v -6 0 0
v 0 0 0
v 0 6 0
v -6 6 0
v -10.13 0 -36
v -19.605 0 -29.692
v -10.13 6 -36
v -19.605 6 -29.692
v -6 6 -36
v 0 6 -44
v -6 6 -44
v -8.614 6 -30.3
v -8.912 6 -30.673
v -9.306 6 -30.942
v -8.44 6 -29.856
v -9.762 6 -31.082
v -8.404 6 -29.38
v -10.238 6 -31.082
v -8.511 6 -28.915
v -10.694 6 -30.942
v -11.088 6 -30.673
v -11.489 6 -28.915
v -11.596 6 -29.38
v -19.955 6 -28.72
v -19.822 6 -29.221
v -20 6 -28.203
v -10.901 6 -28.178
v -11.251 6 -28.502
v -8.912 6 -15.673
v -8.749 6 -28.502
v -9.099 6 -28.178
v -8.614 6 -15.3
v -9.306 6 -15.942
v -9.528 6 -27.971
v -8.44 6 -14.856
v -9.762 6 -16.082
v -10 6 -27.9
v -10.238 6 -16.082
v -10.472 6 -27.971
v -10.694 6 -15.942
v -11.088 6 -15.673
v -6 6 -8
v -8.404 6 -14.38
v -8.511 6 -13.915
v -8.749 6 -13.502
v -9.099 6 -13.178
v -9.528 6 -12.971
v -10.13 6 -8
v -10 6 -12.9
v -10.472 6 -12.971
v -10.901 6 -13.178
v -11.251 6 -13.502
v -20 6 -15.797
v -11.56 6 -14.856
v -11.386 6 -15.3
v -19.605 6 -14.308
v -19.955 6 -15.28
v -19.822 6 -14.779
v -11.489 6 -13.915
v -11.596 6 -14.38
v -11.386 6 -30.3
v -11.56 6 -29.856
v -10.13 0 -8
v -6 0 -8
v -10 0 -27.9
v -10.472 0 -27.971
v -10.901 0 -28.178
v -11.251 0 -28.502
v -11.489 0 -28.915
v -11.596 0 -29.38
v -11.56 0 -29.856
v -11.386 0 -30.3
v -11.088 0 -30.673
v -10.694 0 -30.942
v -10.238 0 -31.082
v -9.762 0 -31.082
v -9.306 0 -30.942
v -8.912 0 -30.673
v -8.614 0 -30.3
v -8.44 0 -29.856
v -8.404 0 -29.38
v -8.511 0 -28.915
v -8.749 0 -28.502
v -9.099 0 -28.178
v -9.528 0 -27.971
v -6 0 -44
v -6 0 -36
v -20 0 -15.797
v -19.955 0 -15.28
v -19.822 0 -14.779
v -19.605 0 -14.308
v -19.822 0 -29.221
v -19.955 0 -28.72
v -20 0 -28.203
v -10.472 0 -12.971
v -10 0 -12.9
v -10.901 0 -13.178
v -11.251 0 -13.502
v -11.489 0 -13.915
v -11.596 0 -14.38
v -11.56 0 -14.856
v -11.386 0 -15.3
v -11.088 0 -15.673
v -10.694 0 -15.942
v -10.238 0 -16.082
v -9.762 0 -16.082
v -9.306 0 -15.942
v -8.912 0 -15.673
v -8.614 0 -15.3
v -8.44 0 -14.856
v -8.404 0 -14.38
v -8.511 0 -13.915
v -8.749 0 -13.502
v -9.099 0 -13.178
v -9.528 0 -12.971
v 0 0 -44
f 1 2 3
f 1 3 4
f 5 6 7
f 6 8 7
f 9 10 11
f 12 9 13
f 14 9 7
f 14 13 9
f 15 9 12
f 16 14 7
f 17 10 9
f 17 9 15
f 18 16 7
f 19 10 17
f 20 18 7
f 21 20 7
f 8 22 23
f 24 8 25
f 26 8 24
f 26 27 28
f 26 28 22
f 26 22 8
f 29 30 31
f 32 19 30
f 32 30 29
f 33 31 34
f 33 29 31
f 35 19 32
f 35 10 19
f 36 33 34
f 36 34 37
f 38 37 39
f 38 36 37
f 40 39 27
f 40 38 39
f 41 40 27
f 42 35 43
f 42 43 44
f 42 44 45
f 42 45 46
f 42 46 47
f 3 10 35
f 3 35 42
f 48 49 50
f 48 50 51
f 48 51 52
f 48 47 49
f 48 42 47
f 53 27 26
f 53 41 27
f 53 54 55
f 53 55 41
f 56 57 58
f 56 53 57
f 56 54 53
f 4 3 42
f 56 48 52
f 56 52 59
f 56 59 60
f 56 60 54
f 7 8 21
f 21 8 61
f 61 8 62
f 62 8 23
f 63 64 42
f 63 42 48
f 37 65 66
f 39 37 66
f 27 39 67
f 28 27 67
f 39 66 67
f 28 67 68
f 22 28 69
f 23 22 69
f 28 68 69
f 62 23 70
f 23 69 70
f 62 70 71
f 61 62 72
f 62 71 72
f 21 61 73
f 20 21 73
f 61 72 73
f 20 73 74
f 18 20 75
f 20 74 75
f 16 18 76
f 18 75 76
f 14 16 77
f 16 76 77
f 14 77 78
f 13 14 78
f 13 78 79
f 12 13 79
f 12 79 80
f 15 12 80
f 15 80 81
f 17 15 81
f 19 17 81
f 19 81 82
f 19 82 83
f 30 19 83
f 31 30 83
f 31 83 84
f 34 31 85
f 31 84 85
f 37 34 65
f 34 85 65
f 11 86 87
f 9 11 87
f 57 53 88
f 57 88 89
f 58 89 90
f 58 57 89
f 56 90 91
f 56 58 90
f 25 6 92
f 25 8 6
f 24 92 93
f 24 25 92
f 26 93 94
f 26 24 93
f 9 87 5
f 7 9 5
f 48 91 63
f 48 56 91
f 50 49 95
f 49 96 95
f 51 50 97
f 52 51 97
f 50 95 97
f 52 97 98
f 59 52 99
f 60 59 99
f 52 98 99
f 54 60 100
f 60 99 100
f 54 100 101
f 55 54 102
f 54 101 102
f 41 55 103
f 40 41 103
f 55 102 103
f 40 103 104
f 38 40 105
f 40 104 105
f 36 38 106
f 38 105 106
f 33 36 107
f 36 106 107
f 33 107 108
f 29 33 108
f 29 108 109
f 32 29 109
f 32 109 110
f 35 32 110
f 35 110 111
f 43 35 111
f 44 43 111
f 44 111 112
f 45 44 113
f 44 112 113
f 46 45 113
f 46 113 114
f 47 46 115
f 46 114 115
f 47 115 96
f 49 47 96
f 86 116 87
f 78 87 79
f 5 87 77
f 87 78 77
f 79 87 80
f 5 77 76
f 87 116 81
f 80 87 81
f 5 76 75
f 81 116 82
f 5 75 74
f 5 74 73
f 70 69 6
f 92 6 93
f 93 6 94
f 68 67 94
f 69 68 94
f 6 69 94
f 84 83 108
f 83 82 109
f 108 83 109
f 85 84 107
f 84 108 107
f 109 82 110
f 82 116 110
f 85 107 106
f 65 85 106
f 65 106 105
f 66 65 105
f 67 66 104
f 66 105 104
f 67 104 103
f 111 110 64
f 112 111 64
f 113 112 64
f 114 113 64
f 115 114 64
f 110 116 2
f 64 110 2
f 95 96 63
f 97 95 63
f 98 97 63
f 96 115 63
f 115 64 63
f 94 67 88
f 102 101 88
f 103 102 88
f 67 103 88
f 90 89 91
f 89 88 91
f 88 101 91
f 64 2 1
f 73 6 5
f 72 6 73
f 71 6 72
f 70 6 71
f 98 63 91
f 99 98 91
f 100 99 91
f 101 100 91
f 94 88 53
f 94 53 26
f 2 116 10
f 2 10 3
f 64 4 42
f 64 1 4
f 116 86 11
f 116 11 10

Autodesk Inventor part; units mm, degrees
ref_plane "YZ Plane" through (0, 0, 0) normal (1, 0, 0) x (0, 1, 0)
ref_plane "XZ Plane" through (0, 0, 0) normal (0, 1, 0) x (-1, 0, 0)
ref_plane "XY Plane" through (0, 0, 0) normal (0, 0, 1) x (1, 0, 0)
sketch "スケッチ1" plane through (0, 0, 0) normal (0, 1, 0) x (-1, 0, 0)
  line L0 (0, 0) -> (6, 0)
  line L1 (0, -44) -> (0, 0)
  line L2 (6, 0) -> (6, -8)
  line L3 (6, -44) -> (6, -36)
  line L4 (6, -36) -> (16, -36)
  line L5 (6, -8) -> (16, -8)
  line L6 (6, -44) -> (0, -44)
  line L7 (16, -8) -> (20, -15)
  line L8 (16, -36) -> (20, -29)
  line L9 (20, -15) -> (20, -29)
  point P0 (0, -22)
  point P1 (10, -14.5)
  point P2 (10, -29.5)
  dimension "d2" = 8
  dimension "d3" = 6
  dimension "d4" = 8
  dimension "d5" = 6
  dimension "d9" = 10
  dimension "d10" = 10
  dimension "d11" = 10
extrude "押し出し1" add sketch "スケッチ1" along normal blind 6
sketch "スケッチ2" plane through (0, 6, 0) normal (0, 1, 0) x (1, 0, 0)
  line L0 (0, 0) -> (0, 44) projected
  line L1 (-16, 8) -> (-6, 8) projected
  line L2 (-6, 36) -> (-16, 36) projected
  point P0 (-10, 14.5)
  point P1 (-10, 29.5)
  dimension "d17" = 10
  dimension "d18" = 6.5
  dimension "d19" = 10
  dimension "d20" = 6.5
hole "穴1" at (-10, 6, -14.5) at (-10, 6, -29.5) direction (0, -1, 0) diameter 3.2 end through all
fillet "フィレット1" radius 3 2 edges at (-16, 3, -8) (-16, 3, -36)
fillet "フィレット2" radius 3 2 edges at (-20, 3, -29) (-20, 3, -15)
sketch "スケッチ3" plane through (0, 6, 0) normal (0, 1, 0) x (1, 0, 0)
  arc A0 (-20, 15.7967) -> (-19.6047, 14.3083) centre (-17, 15.7967) ccw projected
  line L0 (-19.6047, 14.3083) -> (-10.1295, 8)
  line L1 (-14.259, 8) -> (-6, 8) projected
  line L2 (-20, 28.2033) -> (-20, 15.7967) projected
  line L3 (-20, 22) -> (-17.294, 22)
  line L4 (-19.6047, 29.6917) -> (-10.1295, 36)
  line L5 (-10.1295, 8) -> (-16.3751, 6.1485)
  line L6 (-19.6047, 14.3083) -> (-16.8638, 9.5116) projected
  line L7 (-16.3751, 6.1485) -> (-19.6047, 14.3083)
  line L8 (-16.8638, 34.4884) -> (-19.6047, 29.6917) projected
  line L9 (-19.6047, 29.6917) -> (-16.8449, 39.8374)
  line L10 (-16.8449, 39.8374) -> (-10.1295, 36)
  point P0 (0, 0)
extrude "押し出し2" cut sketch "スケッチ3" against normal blind 10
properties part number "射出_ベルト固定" material "PET プラスチック"
